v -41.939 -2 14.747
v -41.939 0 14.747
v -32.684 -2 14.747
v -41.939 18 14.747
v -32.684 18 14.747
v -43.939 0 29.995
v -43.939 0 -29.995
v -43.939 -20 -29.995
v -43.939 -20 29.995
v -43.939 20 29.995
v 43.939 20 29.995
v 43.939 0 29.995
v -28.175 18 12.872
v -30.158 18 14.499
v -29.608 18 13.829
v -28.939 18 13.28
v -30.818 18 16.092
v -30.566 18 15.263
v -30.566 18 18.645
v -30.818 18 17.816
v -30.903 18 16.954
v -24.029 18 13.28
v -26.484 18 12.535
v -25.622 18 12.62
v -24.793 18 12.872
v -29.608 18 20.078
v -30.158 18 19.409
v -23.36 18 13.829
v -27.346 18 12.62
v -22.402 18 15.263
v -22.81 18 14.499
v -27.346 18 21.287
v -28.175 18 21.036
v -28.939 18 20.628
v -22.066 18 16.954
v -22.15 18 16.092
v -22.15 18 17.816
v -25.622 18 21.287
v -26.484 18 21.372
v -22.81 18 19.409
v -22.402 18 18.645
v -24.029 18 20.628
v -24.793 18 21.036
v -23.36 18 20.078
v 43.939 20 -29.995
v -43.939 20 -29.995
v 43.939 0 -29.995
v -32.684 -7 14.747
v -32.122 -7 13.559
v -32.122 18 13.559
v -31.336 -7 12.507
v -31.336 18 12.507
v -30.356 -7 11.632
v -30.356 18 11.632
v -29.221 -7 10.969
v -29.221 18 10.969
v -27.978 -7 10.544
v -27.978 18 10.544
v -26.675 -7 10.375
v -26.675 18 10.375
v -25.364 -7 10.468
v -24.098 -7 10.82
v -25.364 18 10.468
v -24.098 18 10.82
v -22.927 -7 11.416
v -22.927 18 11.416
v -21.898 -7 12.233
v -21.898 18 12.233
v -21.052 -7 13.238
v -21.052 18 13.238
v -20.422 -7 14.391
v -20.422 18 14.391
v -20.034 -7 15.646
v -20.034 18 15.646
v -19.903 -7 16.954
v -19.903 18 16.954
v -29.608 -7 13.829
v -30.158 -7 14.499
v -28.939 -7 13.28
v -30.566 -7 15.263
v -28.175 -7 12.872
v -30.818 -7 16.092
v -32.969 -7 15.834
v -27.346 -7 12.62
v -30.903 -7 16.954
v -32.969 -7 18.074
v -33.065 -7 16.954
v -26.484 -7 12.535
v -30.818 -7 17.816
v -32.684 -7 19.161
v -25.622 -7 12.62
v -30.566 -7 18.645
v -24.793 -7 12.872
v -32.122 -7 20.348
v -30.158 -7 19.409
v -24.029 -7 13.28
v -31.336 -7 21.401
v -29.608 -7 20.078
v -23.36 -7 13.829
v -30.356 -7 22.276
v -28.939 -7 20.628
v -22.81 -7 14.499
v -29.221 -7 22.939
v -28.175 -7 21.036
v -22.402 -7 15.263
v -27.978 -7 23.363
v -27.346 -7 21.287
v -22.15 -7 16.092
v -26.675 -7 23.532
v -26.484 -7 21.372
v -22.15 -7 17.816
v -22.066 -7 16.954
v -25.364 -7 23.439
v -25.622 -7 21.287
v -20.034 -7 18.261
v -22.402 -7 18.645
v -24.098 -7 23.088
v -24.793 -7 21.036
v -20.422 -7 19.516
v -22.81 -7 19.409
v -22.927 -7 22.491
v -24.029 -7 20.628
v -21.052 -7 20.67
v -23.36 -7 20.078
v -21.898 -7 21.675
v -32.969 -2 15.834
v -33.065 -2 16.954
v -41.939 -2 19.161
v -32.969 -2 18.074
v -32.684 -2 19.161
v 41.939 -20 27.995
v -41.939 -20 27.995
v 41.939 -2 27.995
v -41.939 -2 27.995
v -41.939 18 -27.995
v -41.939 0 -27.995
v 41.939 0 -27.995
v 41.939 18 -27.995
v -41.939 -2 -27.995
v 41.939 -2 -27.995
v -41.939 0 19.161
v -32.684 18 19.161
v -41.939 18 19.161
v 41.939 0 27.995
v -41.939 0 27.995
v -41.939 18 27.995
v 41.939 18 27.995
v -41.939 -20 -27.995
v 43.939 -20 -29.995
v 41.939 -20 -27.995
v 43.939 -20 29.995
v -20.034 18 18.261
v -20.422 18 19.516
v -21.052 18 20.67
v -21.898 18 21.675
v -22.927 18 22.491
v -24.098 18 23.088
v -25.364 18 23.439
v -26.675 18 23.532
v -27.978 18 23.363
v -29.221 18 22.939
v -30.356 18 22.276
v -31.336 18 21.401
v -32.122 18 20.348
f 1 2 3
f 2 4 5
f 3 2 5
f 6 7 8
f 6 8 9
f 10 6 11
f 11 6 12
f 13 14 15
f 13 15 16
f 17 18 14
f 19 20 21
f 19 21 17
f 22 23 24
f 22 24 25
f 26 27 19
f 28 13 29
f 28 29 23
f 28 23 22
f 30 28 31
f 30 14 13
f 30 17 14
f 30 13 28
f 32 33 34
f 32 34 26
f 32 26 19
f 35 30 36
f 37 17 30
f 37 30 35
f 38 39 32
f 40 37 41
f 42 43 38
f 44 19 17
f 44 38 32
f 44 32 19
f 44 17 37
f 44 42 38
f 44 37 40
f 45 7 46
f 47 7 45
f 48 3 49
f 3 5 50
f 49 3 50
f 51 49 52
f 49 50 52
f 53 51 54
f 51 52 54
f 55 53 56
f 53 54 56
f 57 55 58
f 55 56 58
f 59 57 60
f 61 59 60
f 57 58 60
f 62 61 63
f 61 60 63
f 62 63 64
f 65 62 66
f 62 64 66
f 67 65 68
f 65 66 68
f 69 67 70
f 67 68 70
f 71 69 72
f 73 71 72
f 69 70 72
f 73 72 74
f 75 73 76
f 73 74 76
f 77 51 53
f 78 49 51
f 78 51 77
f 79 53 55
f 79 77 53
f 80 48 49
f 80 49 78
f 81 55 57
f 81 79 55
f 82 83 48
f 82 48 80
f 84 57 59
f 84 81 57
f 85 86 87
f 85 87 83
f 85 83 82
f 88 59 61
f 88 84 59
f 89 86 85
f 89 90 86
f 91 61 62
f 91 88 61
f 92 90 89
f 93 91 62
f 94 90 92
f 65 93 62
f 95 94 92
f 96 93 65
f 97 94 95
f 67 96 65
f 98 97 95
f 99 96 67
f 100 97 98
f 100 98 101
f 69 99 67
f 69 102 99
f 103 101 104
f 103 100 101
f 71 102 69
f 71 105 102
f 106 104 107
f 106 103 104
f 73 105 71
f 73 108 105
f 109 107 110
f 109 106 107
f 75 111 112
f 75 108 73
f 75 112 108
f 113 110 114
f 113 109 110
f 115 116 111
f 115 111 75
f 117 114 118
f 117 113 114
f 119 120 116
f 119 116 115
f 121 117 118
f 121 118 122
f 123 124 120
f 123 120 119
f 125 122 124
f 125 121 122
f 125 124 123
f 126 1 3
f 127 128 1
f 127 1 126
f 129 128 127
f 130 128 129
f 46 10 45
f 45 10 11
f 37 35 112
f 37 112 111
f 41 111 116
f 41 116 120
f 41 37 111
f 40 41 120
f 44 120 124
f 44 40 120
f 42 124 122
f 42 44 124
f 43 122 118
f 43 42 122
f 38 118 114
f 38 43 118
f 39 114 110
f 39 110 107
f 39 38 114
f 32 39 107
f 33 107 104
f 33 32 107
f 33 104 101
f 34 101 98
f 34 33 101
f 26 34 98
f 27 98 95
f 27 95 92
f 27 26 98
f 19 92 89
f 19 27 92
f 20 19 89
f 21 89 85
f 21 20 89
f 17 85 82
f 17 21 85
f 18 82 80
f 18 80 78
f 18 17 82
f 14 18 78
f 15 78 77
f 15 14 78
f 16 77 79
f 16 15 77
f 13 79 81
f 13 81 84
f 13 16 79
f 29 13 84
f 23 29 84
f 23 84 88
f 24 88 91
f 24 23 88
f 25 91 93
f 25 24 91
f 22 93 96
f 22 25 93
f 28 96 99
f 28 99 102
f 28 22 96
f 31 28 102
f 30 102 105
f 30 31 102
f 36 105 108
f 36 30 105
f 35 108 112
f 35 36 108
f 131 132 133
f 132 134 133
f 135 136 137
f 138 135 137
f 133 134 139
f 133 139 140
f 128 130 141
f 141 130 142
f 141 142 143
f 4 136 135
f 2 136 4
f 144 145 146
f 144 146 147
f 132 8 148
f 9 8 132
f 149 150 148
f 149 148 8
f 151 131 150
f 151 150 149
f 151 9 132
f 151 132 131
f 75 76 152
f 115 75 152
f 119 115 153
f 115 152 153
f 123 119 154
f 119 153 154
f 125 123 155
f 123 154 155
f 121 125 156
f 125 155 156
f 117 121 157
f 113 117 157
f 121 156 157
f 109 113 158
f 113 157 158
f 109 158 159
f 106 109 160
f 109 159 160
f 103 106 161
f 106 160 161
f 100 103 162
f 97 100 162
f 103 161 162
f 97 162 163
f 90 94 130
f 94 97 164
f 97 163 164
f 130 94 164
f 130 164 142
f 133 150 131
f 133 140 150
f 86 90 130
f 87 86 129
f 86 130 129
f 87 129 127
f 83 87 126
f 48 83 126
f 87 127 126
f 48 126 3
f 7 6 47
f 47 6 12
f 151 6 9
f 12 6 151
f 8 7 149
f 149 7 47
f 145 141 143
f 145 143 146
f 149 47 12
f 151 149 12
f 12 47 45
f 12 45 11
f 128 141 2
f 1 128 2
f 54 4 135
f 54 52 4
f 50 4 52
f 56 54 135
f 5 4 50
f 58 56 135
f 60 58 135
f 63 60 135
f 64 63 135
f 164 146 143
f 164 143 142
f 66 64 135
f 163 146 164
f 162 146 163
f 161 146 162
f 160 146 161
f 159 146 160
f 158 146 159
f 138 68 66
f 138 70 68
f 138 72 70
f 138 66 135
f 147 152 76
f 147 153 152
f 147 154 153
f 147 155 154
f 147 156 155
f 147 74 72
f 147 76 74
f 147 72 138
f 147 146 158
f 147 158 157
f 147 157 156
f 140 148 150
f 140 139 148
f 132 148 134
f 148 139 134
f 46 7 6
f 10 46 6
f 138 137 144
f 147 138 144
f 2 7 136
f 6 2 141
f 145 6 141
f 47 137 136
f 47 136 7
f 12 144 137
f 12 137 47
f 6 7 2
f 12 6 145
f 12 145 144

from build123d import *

# Parameters (mm, degrees)
F0_W     = 87.8789871931
F0_H     = 59.9904470146
F1_DEPTH = 20
F2_T     = -2
F3_R     = 4.4185706022
F4_DEPTH = 25
F5_DEPTH = 20
F6_W     = 87.8789871931
F6_H     = 59.9904470146
F7_DEPTH = 20
F8_T     = -2


# Not quite as in the source:
# - ends of sketch curves that miss each other by under 0.0002 mm in the source are joined


with BuildPart() as f1:
    # F0 (on Front) → F1 (new body)
    with BuildSketch(Plane.XZ):
        Rectangle(F0_W, F0_H)
    extrude(amount=-F1_DEPTH)

    # F2
    f2_openings = [f1.faces().sort_by_distance(p)[0] for p in [
        (0, 0, 0),
    ]]
    offset(amount=F2_T, openings=f2_openings)

    # F3 (on face) → F4 (join)
    with BuildSketch(Plane.XZ.offset(-18)):
        with BuildLine():
            ThreePointArc((-32.6843762426, 14.7468157928), (-25.3642450586, 10.4684114553), (-19.9026966179, 16.9538222253))
            ThreePointArc((-19.9026966179, 16.9538222253), (-25.3642446263, 23.4392329207), (-32.6843759484, 19.1608294845))
            ThreePointArc((-32.6843759484, 19.1608294845), (-33.0654589748, 16.953822664), (-32.6843762426, 14.7468157928))
        make_face()
        with Locations((-26.4840777963, 16.9538222253)):
            Circle(F3_R, mode=Mode.SUBTRACT)
    extrude(amount=F4_DEPTH)

    # F3 (on face) → F5 (join)
    with BuildSketch(Plane.XZ.offset(-18)):
        with BuildLine():
            ThreePointArc((-32.6843762426, 14.7468157928), (-33.0654589748, 16.953822664), (-32.6843759484, 19.1608294845))
            Line((-32.6843759484, 19.1608294845), (-41.9394935966, 19.1608294845))
            Line((-41.9394935966, 19.1608294845), (-41.9394935966, 14.7468158975))
            Line((-41.9394935966, 14.7468158975), (-32.6843762426, 14.7468157928))
        make_face()
    extrude(amount=F5_DEPTH)


with BuildPart() as f7:
    # F6 (on Front) → F7 (new body)
    with BuildSketch(Plane.XZ):
        Rectangle(F6_W, F6_H)
    extrude(amount=F7_DEPTH)

    # F8
    f8_openings = [f7.faces().sort_by_distance(p)[0] for p in [
        (0, -20, 0),
    ]]
    offset(amount=F8_T, openings=f8_openings)


solid = Compound([f1.part, f7.part])
